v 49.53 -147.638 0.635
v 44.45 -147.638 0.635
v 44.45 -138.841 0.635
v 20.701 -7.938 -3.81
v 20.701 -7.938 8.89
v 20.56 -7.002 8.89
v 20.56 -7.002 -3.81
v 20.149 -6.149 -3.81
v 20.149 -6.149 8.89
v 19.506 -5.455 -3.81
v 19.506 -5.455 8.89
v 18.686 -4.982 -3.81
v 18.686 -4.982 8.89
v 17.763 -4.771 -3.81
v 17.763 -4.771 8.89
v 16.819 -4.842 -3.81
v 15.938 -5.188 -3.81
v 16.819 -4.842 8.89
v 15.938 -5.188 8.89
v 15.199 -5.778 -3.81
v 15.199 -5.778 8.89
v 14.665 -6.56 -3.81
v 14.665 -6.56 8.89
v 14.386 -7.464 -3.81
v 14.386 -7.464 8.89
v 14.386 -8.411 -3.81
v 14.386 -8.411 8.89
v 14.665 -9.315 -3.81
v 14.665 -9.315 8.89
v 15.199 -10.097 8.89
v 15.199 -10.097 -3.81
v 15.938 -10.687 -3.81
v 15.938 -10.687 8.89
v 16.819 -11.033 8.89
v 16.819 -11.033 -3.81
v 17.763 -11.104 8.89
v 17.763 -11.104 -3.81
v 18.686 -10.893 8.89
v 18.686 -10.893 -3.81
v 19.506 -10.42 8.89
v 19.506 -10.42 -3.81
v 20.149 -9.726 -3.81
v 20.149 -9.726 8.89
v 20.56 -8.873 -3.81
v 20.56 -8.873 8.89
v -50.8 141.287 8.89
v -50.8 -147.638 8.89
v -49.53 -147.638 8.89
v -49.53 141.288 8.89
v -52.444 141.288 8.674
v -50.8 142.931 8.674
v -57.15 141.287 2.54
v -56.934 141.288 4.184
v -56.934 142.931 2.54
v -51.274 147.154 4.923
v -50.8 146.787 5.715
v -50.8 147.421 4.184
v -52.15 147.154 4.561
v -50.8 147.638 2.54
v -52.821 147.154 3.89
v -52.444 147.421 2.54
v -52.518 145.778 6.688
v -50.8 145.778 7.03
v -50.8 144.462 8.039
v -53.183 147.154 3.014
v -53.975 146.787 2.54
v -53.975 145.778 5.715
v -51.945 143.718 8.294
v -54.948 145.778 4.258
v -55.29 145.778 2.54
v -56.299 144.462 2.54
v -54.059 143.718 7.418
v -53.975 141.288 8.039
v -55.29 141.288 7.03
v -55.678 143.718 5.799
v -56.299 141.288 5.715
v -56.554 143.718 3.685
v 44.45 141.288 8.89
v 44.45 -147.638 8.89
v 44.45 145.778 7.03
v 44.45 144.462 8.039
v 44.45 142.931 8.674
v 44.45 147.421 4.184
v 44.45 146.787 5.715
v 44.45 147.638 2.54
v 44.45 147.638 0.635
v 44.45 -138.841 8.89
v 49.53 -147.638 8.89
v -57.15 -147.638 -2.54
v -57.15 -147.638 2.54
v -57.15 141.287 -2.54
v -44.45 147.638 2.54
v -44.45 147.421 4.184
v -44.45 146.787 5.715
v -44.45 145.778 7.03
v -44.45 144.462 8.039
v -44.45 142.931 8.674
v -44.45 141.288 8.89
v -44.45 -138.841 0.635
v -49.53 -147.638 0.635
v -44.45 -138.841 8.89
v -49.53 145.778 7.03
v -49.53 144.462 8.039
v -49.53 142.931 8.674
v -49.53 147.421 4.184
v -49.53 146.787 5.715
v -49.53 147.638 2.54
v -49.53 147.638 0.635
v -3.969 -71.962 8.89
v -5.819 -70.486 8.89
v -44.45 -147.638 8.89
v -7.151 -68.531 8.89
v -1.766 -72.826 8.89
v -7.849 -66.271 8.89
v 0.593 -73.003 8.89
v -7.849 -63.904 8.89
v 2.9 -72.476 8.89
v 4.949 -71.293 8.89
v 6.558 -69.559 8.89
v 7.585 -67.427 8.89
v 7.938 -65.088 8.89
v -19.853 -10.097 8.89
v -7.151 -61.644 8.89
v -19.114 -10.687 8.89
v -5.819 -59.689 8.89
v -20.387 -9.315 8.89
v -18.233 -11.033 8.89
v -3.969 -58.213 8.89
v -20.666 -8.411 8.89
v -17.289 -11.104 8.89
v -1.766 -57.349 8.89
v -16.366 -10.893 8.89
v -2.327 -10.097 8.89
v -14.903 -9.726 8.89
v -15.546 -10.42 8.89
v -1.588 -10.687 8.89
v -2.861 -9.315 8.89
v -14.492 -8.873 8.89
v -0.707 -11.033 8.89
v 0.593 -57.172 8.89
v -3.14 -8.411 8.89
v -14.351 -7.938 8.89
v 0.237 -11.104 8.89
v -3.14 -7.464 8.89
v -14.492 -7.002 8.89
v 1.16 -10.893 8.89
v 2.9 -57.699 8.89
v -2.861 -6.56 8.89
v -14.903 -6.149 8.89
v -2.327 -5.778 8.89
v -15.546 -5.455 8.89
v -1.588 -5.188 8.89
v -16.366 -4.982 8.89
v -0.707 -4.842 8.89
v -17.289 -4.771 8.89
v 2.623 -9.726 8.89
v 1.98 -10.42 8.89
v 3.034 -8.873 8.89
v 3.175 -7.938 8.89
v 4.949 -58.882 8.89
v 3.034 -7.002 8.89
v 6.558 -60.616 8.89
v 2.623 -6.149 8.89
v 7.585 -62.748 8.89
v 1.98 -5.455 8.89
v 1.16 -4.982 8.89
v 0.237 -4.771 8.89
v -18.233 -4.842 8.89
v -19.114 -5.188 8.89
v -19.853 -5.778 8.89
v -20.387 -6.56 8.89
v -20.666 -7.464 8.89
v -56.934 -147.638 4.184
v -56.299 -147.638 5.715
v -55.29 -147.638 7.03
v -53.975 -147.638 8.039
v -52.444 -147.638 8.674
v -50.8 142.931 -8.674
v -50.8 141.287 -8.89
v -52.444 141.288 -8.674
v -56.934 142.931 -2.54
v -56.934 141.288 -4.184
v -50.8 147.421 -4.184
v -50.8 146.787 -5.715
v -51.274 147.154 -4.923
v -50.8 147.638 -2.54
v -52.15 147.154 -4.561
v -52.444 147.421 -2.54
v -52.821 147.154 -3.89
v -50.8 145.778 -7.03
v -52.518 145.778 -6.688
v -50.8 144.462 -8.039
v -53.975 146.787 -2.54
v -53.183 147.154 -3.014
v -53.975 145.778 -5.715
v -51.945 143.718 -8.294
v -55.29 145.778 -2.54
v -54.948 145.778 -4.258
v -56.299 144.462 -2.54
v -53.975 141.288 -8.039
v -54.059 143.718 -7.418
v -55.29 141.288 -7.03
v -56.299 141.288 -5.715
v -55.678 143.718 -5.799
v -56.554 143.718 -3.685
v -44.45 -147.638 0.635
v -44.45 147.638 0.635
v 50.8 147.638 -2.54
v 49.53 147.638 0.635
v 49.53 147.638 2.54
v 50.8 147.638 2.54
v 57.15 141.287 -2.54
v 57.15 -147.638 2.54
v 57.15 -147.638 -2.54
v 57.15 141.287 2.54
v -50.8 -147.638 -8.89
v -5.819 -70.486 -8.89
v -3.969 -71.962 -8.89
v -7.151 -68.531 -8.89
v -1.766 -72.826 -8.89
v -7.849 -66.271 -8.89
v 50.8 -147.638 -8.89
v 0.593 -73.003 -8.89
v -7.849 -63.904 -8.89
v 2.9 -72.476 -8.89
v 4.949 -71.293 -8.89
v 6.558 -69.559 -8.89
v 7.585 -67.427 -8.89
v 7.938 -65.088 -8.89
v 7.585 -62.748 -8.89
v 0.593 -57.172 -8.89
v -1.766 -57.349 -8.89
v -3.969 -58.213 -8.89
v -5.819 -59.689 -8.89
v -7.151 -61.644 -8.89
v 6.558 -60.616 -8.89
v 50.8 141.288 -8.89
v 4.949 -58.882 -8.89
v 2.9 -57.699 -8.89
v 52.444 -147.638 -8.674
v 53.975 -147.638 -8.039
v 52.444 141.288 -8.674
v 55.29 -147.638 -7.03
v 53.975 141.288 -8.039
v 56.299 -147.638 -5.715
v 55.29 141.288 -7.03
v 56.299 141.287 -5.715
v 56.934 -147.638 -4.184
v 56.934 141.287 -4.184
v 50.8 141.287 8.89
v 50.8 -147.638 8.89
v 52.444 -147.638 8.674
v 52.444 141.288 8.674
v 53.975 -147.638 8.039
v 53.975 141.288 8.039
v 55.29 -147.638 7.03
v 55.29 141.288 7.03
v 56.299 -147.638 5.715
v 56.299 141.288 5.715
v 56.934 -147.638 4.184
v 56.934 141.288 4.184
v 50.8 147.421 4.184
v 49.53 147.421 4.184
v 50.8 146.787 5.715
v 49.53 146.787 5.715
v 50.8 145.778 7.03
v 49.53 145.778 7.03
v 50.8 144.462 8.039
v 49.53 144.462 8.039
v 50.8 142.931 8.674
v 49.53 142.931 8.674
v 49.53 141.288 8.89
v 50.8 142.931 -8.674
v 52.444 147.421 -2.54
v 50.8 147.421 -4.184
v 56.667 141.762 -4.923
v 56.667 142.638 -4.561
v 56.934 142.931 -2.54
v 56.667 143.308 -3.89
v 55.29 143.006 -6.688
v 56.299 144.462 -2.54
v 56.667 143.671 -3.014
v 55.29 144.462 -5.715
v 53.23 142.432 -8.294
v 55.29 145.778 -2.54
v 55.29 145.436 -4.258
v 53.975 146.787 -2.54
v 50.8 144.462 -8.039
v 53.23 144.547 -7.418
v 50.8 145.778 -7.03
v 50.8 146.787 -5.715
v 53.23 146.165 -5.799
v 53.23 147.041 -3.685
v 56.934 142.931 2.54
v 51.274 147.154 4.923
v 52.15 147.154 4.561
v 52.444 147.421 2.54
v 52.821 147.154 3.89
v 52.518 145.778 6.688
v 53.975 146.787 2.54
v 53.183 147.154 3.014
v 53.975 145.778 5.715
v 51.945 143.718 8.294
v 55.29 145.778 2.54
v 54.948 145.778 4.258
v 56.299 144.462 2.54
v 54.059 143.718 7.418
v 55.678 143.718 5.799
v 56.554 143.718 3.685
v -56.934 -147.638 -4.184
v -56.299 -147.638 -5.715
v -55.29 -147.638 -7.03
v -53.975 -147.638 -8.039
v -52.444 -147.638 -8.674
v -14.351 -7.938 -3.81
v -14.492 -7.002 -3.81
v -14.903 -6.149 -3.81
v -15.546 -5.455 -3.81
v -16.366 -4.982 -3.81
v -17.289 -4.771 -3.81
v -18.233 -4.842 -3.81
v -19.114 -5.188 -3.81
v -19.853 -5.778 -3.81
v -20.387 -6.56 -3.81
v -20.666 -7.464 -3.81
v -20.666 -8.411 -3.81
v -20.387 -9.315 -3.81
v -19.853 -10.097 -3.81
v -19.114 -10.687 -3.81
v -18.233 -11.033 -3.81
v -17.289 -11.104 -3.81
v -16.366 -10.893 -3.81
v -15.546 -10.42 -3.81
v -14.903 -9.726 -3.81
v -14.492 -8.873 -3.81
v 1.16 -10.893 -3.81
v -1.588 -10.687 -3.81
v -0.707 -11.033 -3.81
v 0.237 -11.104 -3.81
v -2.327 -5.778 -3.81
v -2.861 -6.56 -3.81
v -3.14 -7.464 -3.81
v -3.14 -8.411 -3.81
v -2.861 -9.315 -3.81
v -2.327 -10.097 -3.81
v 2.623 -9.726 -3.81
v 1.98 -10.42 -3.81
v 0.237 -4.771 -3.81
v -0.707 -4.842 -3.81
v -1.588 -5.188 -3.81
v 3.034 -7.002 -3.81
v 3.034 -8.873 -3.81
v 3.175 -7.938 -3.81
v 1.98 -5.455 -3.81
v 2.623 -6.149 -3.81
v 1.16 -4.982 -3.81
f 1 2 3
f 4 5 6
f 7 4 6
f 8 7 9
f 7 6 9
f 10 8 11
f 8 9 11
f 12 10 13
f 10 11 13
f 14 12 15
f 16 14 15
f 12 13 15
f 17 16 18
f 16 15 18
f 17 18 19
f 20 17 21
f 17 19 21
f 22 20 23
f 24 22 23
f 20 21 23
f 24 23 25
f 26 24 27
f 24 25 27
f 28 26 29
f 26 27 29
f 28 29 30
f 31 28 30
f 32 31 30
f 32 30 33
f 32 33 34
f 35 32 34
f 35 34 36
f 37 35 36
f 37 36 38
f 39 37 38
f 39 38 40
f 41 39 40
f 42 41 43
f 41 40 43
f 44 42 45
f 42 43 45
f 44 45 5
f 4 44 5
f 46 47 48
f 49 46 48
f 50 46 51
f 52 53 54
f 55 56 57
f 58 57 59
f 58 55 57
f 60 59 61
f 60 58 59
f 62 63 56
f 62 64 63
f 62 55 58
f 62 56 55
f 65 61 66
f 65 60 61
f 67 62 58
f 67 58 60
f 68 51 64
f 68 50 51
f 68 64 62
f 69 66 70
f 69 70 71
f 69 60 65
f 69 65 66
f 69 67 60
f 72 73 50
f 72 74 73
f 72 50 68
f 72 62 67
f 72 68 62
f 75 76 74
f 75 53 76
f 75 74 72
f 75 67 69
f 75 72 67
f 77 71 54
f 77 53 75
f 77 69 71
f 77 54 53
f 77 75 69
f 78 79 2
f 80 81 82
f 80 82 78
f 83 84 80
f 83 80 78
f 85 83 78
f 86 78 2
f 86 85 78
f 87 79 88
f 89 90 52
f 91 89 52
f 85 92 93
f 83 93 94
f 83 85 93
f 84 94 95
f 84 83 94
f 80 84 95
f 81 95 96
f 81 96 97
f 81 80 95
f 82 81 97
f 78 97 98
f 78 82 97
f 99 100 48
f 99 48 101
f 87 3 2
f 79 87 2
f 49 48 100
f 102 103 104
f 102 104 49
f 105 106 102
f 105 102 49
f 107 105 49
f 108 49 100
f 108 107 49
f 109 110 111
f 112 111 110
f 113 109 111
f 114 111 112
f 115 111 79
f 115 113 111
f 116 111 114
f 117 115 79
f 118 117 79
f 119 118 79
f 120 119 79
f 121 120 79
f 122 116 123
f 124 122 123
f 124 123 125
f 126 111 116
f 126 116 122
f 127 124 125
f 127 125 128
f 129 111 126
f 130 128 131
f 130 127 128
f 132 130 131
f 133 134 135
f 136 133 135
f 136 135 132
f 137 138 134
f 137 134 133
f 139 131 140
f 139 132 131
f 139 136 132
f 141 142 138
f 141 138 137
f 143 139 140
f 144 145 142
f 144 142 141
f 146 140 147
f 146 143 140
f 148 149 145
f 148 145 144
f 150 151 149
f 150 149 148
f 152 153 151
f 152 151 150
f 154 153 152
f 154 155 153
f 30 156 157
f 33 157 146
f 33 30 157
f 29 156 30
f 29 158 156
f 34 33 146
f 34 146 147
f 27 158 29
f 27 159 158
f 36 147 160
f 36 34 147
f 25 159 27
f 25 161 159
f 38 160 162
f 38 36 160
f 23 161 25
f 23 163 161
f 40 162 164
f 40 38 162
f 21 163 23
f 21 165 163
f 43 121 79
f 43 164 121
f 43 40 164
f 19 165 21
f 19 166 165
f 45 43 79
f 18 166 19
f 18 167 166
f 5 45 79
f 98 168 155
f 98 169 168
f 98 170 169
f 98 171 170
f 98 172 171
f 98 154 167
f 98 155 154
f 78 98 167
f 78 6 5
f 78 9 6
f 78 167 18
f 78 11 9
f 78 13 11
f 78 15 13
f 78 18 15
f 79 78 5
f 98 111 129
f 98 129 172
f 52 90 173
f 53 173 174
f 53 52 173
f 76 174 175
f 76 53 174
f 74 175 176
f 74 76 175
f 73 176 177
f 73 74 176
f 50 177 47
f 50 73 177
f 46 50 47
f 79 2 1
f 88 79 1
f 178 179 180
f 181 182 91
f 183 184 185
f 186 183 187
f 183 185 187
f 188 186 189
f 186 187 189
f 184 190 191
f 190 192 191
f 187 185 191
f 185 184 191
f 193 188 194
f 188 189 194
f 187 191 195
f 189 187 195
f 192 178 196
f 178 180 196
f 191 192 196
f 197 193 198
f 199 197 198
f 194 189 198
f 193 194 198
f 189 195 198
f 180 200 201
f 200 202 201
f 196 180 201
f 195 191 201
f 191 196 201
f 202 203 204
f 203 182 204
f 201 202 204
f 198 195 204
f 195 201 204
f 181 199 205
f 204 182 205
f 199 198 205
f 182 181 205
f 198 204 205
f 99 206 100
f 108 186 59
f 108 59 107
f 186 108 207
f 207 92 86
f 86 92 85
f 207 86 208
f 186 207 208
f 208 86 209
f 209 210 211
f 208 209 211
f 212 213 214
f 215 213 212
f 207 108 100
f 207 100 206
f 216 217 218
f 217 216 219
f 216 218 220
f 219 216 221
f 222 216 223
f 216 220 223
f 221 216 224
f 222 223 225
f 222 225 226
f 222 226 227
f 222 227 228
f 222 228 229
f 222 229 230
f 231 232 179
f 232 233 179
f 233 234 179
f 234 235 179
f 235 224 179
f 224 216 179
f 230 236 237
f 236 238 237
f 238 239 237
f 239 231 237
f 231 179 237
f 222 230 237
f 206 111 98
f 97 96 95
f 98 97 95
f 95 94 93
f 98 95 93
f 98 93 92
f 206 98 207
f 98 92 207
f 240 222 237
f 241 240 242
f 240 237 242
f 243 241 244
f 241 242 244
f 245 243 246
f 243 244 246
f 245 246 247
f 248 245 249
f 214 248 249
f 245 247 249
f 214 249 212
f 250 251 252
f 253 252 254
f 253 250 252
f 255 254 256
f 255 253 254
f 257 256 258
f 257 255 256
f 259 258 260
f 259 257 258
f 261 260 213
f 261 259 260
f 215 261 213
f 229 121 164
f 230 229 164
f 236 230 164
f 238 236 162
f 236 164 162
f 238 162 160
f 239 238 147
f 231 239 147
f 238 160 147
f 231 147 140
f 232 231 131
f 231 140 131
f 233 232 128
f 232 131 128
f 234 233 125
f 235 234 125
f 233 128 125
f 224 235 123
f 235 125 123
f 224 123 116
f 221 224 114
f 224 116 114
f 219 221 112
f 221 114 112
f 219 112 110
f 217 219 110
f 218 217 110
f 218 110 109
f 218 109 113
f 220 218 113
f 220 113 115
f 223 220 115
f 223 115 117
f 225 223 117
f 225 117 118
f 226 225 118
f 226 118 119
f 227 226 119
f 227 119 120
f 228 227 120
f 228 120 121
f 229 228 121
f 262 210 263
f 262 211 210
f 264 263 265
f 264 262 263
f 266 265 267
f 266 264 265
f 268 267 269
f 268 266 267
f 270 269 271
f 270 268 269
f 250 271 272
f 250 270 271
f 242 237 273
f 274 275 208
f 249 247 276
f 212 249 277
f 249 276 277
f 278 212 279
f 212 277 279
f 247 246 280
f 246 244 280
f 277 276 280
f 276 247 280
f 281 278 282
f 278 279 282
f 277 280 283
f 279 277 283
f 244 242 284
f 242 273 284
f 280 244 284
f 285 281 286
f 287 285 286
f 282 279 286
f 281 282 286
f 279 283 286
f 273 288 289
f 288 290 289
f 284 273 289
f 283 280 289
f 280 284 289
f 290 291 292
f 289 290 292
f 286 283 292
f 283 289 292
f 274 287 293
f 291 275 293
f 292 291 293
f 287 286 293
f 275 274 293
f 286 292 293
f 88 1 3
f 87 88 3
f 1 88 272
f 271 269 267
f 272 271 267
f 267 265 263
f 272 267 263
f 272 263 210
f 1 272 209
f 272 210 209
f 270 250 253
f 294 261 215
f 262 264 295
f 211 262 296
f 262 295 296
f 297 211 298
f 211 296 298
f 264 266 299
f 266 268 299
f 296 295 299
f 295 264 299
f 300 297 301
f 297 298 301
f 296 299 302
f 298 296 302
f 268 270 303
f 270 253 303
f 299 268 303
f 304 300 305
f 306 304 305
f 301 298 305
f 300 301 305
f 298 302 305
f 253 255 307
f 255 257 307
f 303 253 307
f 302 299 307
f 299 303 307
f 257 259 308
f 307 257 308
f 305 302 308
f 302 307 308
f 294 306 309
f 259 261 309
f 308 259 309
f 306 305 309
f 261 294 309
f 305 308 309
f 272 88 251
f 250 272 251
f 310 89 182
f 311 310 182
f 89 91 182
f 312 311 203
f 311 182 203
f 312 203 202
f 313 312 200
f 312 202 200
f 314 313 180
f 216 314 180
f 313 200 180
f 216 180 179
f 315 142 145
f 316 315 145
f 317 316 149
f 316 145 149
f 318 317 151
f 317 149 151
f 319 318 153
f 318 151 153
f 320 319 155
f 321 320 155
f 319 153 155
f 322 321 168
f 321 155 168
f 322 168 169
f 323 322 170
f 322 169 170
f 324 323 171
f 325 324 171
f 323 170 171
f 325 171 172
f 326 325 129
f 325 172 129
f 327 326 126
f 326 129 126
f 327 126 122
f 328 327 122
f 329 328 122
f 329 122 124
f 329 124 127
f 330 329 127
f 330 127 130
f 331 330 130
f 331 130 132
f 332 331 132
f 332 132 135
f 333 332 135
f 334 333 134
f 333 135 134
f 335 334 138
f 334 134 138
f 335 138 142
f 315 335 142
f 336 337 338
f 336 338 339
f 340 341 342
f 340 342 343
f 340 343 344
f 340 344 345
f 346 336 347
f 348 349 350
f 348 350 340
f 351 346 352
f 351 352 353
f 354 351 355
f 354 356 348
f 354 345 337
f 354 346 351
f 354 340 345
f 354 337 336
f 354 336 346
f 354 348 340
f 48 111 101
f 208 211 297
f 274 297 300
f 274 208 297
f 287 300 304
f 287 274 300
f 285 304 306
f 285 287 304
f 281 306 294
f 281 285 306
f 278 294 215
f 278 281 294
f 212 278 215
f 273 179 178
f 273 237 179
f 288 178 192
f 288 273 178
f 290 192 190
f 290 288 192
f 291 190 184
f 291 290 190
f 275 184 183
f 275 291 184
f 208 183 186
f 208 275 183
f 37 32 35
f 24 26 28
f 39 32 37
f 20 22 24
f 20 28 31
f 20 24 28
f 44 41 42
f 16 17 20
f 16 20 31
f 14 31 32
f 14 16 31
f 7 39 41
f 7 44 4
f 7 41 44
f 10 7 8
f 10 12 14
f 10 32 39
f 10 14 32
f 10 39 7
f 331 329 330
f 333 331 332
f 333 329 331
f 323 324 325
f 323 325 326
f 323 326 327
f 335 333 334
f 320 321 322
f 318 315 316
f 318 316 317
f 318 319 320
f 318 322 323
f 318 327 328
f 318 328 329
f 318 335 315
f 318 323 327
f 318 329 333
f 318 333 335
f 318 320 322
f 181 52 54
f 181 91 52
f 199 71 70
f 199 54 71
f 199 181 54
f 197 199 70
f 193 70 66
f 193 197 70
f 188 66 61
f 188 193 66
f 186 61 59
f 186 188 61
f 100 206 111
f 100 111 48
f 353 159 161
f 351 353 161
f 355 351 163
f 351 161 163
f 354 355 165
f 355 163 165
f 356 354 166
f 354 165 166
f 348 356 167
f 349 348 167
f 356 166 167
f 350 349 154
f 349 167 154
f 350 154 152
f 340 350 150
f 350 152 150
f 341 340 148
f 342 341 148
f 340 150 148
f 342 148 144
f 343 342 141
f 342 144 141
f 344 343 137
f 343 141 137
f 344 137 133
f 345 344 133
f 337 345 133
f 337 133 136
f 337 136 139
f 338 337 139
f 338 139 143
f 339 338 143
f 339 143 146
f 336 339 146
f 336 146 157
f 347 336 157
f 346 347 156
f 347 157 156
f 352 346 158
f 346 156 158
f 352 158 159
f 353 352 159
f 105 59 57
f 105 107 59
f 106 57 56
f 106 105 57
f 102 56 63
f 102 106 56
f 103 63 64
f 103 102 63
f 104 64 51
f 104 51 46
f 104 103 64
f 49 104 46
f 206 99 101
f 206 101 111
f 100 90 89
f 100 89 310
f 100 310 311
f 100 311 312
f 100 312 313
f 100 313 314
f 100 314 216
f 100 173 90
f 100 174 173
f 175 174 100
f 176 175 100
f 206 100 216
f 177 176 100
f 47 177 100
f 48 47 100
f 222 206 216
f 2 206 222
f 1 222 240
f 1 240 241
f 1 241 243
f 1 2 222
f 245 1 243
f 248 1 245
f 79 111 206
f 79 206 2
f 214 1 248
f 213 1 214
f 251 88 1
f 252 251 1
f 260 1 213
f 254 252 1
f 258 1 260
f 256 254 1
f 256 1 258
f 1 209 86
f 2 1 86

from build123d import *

# Parameters (mm, degrees)
SKETCH1_W             = 114.3
SKETCH1_H             = 295.275
BOSS_EXTRUDE1_DEPTH   = 8.89
SKETCH2_R             = 3.175
CUT_EXTRUDE1_DEPTH    = 12.7
SKETCH3_W             = 5.08
SKETCH3_H             = 8.255
CUT_EXTRUDE2_DEPTH    = 296.275
FILLET1_R             = 6.35
SKETCH5_R             = 7.9375
CUT_EXTRUDE4_DEPTH    = 18.78
BOSS_EXTRUDE5_DEPTH   = 8.255
BOSS_EXTRUDE5_2_DEPTH = 8.255


with BuildPart() as part:
    # Sketch1 → Boss-Extrude1 (new body, symmetric)
    with BuildSketch(Plane.XY):
        Rectangle(SKETCH1_W, SKETCH1_H)
    extrude(amount=BOSS_EXTRUDE1_DEPTH, both=True)

    # Sketch2 → Cut-Extrude1 (cut)
    with BuildSketch(Plane.XY.offset(8.89)):
        with Locations((0, -7.9375)):
            Circle(SKETCH2_R)
        with Locations((-17.526, -7.9375)):
            Circle(SKETCH2_R)
        with Locations((17.526, -7.9375)):
            Circle(SKETCH2_R)
    extrude(amount=-CUT_EXTRUDE1_DEPTH, mode=Mode.SUBTRACT)

    # Sketch3 → Cut-Extrude2 (cut, through all)
    with BuildSketch(Plane(origin=(0, 147.6375, 0), x_dir=(1, 0, 0), z_dir=(0, 1, 0))):
        with Locations((-46.99, -4.7625)):
            Rectangle(SKETCH3_W, SKETCH3_H)
    cut_extrude2 = extrude(amount=-CUT_EXTRUDE2_DEPTH, mode=Mode.SUBTRACT)

    # Mirror1: Cut-Extrude2 across plane
    add(cut_extrude2.mirror(Plane(origin=(0, 0, 0), x_dir=(0, 0, 1), z_dir=(1, 0, 0))), mode=Mode.SUBTRACT)

    # Fillet1
    fillet1_edges = [part.edges().sort_by_distance(p)[0] for p in [
        (-57.15, 0, 8.89),
        (-53.34, 147.6375, 8.89),
        (57.15, 0, 8.89),
        (0, 147.6375, 8.89),
        (-57.15, 0, -8.89),
        (0, 147.6375, -8.89),
        (57.15, 0, -8.89),
        (53.34, 147.6375, 8.89),
        (-57.15, 147.6375, 0),
        (57.15, 147.6375, 0),
    ]]
    fillet(fillet1_edges, radius=FILLET1_R)

    # Sketch5 → Cut-Extrude4 (cut, through all)
    with BuildSketch(Plane.XY.offset(8.89)):
        with Locations((0, -65.0875)):
            Circle(SKETCH5_R)
    extrude(amount=-CUT_EXTRUDE4_DEPTH, mode=Mode.SUBTRACT)


with BuildPart() as body_2:
    # Sketch6 → Boss-Extrude5 (new body)
    with BuildSketch(Plane.XY.offset(0.635)):
        Polygon((-49.53, -147.6375), (-44.45, -138.84082047), (-44.45, -147.6375), align=None)
    extrude(amount=BOSS_EXTRUDE5_DEPTH)


with BuildPart() as body_3:
    # Sketch6 → Boss-Extrude5 2 (new body)
    with BuildSketch(Plane.XY.offset(0.635)):
        Polygon((49.53, -147.6375), (44.45, -138.84082047), (44.45, -147.6375), align=None)
    extrude(amount=BOSS_EXTRUDE5_2_DEPTH)


solid = Compound([part.part, body_2.part, body_3.part])
